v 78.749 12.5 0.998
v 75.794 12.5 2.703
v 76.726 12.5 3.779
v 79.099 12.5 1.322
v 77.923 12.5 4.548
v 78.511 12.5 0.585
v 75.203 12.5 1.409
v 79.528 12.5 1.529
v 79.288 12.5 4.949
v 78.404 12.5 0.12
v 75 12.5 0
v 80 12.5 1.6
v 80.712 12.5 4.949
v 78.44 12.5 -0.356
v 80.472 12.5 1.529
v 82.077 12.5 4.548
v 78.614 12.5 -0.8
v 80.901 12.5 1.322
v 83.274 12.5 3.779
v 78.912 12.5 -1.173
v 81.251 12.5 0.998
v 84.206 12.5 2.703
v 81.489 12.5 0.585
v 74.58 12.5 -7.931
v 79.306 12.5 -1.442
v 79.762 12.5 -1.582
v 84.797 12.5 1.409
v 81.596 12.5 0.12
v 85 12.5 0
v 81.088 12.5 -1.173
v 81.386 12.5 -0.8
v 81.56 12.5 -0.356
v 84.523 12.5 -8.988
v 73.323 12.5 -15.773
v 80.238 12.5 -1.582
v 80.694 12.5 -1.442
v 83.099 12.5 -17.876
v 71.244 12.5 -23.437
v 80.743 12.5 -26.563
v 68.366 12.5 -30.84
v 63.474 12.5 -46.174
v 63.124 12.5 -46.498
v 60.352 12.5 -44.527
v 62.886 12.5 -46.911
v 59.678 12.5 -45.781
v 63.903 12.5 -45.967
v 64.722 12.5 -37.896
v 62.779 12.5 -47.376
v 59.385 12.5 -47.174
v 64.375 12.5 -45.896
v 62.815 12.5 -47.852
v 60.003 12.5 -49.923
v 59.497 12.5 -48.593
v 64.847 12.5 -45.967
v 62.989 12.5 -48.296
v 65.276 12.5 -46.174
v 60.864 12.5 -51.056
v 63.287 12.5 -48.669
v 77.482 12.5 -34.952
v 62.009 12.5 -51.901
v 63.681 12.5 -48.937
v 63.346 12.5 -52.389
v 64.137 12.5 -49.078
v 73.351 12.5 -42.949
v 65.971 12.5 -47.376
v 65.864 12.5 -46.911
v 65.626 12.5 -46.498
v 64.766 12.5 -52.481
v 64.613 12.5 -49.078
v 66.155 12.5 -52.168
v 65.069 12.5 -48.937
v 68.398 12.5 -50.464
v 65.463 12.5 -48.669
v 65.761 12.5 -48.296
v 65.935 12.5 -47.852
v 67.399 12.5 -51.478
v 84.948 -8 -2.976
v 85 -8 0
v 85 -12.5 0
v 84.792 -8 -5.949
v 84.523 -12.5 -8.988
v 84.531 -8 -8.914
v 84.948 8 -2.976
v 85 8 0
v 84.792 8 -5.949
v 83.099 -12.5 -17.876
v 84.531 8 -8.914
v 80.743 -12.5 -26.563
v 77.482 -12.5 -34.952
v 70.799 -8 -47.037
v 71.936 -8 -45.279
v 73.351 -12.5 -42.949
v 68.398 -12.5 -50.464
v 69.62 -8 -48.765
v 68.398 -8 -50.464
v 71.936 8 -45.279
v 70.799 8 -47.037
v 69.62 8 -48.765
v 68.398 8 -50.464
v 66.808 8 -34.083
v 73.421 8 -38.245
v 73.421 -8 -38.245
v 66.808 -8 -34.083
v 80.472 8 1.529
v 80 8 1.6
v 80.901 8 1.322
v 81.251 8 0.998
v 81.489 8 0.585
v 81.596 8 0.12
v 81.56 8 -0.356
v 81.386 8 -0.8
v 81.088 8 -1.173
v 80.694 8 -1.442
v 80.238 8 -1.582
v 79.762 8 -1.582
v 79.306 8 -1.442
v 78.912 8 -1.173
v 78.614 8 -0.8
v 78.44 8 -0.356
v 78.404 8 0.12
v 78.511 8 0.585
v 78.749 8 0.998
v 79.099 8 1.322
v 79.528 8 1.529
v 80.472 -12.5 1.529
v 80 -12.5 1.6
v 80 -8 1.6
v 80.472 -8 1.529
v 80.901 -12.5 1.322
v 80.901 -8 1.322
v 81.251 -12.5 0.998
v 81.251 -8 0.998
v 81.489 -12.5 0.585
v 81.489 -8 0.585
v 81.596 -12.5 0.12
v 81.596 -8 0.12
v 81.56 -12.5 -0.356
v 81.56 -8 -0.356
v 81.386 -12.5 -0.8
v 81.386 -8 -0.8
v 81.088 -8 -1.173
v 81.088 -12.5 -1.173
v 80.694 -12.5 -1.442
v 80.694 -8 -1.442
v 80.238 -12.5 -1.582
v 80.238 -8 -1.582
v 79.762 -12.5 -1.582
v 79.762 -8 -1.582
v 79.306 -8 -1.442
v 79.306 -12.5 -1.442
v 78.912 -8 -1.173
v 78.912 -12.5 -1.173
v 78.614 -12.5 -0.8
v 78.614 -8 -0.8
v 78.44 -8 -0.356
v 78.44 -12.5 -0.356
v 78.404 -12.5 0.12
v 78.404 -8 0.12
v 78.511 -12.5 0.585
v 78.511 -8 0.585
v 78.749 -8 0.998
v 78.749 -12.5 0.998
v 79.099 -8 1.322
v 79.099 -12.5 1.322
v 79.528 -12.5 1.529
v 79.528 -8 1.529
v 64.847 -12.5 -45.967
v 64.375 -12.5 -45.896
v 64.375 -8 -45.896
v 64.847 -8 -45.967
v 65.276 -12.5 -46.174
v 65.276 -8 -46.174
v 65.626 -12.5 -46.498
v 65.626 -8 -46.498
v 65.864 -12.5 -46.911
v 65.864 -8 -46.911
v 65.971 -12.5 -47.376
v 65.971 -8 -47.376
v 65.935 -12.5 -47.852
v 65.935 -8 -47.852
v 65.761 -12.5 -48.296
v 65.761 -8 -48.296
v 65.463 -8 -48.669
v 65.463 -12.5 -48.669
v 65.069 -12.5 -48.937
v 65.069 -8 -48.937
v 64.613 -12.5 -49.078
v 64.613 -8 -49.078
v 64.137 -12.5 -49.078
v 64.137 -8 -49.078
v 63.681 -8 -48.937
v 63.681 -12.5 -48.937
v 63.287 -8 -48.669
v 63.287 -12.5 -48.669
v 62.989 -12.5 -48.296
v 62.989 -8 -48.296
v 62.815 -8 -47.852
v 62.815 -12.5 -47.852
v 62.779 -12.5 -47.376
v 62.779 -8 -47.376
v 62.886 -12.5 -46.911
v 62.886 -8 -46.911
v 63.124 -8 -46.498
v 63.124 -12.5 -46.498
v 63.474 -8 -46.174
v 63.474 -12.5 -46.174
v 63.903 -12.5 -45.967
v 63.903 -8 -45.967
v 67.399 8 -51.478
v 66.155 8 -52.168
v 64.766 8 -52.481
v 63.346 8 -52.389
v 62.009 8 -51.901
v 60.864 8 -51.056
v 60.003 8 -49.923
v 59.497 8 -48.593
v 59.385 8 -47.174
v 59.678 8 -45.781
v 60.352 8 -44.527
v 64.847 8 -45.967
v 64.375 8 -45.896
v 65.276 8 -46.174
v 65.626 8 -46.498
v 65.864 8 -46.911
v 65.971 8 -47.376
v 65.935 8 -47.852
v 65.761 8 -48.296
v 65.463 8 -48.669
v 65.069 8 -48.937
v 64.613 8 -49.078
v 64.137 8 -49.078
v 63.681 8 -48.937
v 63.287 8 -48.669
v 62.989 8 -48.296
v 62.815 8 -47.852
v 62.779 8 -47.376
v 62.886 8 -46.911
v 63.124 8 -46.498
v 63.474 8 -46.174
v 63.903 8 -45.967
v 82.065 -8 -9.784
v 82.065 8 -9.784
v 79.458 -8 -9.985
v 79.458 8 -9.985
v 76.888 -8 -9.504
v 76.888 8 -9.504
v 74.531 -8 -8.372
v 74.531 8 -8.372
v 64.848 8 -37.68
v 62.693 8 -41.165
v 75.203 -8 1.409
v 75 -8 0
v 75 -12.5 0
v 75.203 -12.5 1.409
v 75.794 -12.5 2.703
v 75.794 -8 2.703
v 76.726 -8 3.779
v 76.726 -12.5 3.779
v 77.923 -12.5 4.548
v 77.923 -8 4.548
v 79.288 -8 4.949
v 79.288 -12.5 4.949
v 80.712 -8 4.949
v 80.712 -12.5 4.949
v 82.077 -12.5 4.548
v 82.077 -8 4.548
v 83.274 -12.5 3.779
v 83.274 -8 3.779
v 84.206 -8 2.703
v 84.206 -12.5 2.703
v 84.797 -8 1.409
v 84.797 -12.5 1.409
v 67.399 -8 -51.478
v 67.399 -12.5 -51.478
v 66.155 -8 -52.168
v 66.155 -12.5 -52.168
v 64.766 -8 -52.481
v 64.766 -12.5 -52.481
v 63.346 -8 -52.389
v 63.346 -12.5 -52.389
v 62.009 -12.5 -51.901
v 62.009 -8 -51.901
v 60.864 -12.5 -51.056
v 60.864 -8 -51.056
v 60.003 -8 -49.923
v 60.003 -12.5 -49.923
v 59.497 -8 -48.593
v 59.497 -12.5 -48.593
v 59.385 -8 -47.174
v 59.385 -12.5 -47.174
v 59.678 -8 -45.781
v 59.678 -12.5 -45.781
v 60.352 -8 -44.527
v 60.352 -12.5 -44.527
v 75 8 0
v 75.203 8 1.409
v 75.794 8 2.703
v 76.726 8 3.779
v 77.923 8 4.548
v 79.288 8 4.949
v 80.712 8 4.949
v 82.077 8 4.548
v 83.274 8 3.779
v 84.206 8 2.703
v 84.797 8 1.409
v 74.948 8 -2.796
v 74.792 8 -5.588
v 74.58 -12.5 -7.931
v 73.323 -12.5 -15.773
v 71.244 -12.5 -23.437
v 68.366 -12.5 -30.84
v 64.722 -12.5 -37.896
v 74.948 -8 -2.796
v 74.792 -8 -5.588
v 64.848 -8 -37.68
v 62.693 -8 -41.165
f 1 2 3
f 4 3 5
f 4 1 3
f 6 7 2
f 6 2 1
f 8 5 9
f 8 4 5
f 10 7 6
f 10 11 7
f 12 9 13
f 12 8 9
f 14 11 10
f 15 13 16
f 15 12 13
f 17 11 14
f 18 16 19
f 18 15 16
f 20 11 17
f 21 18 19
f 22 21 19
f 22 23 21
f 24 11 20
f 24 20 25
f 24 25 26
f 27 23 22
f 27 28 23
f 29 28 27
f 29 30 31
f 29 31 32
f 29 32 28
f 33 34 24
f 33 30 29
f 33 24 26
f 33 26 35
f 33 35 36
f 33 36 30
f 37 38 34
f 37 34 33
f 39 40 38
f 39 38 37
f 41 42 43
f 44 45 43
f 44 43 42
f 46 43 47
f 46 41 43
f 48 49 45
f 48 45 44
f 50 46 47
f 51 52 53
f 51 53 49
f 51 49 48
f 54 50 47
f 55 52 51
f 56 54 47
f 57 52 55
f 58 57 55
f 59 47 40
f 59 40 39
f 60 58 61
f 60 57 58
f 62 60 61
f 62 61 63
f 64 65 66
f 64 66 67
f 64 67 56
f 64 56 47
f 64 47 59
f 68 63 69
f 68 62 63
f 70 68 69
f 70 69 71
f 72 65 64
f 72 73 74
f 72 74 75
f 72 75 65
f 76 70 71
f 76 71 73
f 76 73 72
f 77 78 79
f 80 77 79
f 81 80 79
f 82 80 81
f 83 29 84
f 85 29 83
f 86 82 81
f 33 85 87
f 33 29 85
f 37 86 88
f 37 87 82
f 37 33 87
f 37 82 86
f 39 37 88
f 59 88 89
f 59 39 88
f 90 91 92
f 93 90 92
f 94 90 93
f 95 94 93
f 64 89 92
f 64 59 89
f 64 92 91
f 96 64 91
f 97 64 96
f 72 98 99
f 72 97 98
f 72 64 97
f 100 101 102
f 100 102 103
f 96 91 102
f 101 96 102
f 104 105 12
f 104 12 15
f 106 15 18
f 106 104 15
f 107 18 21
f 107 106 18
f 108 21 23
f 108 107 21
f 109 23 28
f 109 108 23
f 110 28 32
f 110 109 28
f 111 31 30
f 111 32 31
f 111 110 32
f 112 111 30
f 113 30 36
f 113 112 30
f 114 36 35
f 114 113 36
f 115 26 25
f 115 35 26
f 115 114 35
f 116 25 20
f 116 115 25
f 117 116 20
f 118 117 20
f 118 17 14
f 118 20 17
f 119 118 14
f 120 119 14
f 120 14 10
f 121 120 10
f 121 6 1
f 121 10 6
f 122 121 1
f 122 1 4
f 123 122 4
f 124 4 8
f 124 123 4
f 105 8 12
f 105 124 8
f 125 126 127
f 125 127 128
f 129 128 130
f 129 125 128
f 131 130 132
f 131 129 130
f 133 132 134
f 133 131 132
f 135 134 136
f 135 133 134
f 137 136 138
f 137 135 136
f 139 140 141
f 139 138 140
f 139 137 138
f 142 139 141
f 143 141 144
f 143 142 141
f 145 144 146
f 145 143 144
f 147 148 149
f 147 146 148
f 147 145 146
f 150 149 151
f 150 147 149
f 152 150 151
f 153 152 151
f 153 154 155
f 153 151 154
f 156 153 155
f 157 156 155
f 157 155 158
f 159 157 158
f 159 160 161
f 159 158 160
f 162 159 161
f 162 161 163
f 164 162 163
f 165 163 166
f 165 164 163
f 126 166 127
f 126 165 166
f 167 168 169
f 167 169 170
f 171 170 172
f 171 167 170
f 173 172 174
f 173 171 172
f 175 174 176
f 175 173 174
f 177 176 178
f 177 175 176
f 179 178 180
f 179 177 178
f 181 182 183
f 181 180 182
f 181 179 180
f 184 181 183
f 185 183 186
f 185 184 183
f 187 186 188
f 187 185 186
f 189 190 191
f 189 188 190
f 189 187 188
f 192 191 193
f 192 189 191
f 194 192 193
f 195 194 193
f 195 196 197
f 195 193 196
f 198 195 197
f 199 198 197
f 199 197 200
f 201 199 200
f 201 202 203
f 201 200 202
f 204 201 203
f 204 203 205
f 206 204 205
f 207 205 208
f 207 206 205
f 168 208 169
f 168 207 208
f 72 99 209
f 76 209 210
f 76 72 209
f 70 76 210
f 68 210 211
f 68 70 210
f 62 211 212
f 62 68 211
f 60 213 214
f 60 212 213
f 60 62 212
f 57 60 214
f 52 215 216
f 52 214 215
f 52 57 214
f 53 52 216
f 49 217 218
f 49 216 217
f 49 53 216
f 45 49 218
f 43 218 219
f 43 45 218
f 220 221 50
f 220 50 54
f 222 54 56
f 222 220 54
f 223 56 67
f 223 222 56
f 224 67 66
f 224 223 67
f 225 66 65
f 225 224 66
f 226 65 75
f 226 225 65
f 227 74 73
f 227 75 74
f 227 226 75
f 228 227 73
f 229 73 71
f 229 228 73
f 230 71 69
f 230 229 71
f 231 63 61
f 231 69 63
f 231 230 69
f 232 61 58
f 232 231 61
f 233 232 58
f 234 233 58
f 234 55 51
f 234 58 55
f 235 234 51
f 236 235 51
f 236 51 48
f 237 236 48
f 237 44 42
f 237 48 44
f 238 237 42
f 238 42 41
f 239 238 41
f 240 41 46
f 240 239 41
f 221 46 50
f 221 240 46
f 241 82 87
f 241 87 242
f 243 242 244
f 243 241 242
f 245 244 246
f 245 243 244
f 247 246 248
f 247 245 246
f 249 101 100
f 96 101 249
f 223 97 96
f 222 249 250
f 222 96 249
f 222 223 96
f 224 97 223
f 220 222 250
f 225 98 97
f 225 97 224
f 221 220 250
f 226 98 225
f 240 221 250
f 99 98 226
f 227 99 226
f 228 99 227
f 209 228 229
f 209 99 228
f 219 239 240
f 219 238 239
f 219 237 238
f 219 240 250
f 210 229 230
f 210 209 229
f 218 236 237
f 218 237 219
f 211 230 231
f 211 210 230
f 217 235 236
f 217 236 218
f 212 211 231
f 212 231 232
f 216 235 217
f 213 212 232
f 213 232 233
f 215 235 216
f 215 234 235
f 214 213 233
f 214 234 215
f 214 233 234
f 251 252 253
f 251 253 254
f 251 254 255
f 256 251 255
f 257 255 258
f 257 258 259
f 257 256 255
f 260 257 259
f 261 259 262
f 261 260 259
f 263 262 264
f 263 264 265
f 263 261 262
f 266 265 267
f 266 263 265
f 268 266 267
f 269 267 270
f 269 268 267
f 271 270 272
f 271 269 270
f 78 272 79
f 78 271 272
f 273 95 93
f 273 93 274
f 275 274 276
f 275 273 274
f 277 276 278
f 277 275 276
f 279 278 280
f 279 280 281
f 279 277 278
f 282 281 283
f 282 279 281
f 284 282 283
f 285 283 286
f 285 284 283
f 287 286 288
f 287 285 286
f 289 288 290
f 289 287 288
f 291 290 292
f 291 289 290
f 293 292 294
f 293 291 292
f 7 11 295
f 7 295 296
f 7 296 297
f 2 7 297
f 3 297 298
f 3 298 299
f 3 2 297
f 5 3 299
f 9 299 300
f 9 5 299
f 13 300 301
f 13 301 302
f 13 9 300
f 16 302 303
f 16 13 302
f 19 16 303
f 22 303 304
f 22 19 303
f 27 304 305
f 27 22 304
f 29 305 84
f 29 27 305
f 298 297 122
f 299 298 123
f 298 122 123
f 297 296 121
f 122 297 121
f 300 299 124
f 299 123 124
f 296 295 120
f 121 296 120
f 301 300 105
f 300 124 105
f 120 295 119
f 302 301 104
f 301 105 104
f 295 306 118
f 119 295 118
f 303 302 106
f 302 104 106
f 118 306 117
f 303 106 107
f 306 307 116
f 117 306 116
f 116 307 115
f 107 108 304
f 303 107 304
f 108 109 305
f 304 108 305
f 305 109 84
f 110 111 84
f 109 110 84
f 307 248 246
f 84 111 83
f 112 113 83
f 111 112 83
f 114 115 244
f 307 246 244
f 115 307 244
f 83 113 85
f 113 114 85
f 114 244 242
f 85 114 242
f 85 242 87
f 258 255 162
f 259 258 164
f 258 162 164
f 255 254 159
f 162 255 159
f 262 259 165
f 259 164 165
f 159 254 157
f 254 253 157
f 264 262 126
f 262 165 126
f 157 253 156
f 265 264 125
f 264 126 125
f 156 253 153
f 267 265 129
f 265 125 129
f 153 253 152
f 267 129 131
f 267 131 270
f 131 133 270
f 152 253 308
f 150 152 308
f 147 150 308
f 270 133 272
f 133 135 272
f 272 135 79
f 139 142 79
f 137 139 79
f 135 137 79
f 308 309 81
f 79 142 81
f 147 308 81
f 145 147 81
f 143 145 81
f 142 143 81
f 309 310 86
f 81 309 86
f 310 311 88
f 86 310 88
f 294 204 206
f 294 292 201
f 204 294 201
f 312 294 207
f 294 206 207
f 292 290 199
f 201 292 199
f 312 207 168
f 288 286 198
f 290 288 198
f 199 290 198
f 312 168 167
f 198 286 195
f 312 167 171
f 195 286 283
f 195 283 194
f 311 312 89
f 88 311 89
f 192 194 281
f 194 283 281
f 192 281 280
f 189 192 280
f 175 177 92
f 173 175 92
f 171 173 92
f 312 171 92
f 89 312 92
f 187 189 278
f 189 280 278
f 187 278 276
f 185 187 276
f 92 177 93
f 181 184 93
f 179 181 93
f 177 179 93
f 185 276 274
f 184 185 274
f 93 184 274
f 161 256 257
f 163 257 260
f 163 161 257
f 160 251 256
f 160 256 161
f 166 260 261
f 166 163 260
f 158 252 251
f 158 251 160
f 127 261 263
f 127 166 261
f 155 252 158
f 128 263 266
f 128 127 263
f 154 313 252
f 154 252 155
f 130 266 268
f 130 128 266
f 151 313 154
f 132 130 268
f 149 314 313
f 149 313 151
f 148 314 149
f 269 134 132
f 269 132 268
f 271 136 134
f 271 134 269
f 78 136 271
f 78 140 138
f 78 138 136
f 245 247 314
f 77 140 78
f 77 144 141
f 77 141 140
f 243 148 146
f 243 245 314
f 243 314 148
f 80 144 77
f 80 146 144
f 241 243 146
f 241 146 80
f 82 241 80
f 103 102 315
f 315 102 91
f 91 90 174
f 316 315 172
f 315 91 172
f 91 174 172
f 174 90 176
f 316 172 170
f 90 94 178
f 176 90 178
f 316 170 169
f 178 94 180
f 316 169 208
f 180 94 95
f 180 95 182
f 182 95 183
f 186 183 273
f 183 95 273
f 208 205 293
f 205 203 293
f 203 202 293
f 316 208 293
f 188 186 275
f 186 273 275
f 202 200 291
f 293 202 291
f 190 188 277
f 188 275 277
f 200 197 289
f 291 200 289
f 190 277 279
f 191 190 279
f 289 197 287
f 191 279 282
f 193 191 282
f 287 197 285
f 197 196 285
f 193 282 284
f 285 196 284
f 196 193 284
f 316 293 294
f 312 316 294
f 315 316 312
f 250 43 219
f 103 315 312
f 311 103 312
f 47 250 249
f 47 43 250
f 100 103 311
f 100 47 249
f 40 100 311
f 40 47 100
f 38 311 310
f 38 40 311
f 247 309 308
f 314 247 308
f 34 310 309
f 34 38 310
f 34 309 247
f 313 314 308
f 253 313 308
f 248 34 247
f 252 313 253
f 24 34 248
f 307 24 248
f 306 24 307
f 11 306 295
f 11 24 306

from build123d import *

# Parameters (mm, degrees)
EXTRUDE_1_DEPTH          = 12.5
SKETCH_2_R               = 10
CUT_EXTRUDE_1_DEPTH      = 8
CUT_EXTRUDE_2_DEPTH      = 103.984553477
CUT_EXTRUDE_2_DEPTH_BACK = 103.984553477
SKETCH_3_R               = 1.6


with BuildPart() as part:
    # 草图1 → 凸台-拉伸1 (new, symmetric)
    with BuildSketch(Plane(origin=(0, 0, 0), x_dir=(1, 0, 0), z_dir=(0, 1, 0))):
        with BuildLine():
            ThreePointArc((60.351562504, 44.527394976), (71.243831971, 23.437499997), (75, 0))
            ThreePointArc((75, 0), (80, -5), (85, 0))
            ThreePointArc((85, 0), (80.743009566, 26.5625), (68.3984375, 50.464380979))
            ThreePointArc((68.3984375, 50.464380979), (61.406506999, 51.519325478), (60.351562504, 44.527394976))
        make_face()
    extrude(amount=EXTRUDE_1_DEPTH, both=True)

    # 草图2 → 切除-拉伸1 (cut, symmetric)
    with BuildSketch(Plane(origin=(0, 0, 0), x_dir=(1, 0, 0), z_dir=(0, 1, 0))):
        with Locations((80, 0)):
            Circle(SKETCH_2_R)
        with BuildLine():
            Line((73.420566464, 38.244601007), (66.808461169, 34.082686459))
            ThreePointArc((66.808461169, 34.082686459), (63.794128955, 39.437407507), (60.351562504, 44.527394976))
            ThreePointArc((60.351562504, 44.527394976), (61.406506999, 51.519325478), (68.3984375, 50.464380979))
            ThreePointArc((68.3984375, 50.464380979), (70.215090022, 47.904500135), (71.935985524, 45.279288717))
            Line((71.935985524, 45.279288717), (73.420566464, 38.244601007))
        make_face()
    extrude(amount=CUT_EXTRUDE_1_DEPTH, both=True, mode=Mode.SUBTRACT)

    # 草图3 → 切除-拉伸2 (cut, two sides: drawn at the far end of the back side and taken through both)
    with BuildSketch(Plane(origin=(0, 12.5, 0), x_dir=(1, 0, 0), z_dir=(0, 1, 0)).offset(-CUT_EXTRUDE_2_DEPTH_BACK)):
        with Locations(Location((64.375, 47.49588798, 0), (0, 0, 270))):
            Circle(SKETCH_3_R)
        with Locations(Location((80, 0, 0), (0, 0, 270))):
            Circle(SKETCH_3_R)
    extrude(amount=CUT_EXTRUDE_2_DEPTH + CUT_EXTRUDE_2_DEPTH_BACK, mode=Mode.SUBTRACT)


solid = part.part
